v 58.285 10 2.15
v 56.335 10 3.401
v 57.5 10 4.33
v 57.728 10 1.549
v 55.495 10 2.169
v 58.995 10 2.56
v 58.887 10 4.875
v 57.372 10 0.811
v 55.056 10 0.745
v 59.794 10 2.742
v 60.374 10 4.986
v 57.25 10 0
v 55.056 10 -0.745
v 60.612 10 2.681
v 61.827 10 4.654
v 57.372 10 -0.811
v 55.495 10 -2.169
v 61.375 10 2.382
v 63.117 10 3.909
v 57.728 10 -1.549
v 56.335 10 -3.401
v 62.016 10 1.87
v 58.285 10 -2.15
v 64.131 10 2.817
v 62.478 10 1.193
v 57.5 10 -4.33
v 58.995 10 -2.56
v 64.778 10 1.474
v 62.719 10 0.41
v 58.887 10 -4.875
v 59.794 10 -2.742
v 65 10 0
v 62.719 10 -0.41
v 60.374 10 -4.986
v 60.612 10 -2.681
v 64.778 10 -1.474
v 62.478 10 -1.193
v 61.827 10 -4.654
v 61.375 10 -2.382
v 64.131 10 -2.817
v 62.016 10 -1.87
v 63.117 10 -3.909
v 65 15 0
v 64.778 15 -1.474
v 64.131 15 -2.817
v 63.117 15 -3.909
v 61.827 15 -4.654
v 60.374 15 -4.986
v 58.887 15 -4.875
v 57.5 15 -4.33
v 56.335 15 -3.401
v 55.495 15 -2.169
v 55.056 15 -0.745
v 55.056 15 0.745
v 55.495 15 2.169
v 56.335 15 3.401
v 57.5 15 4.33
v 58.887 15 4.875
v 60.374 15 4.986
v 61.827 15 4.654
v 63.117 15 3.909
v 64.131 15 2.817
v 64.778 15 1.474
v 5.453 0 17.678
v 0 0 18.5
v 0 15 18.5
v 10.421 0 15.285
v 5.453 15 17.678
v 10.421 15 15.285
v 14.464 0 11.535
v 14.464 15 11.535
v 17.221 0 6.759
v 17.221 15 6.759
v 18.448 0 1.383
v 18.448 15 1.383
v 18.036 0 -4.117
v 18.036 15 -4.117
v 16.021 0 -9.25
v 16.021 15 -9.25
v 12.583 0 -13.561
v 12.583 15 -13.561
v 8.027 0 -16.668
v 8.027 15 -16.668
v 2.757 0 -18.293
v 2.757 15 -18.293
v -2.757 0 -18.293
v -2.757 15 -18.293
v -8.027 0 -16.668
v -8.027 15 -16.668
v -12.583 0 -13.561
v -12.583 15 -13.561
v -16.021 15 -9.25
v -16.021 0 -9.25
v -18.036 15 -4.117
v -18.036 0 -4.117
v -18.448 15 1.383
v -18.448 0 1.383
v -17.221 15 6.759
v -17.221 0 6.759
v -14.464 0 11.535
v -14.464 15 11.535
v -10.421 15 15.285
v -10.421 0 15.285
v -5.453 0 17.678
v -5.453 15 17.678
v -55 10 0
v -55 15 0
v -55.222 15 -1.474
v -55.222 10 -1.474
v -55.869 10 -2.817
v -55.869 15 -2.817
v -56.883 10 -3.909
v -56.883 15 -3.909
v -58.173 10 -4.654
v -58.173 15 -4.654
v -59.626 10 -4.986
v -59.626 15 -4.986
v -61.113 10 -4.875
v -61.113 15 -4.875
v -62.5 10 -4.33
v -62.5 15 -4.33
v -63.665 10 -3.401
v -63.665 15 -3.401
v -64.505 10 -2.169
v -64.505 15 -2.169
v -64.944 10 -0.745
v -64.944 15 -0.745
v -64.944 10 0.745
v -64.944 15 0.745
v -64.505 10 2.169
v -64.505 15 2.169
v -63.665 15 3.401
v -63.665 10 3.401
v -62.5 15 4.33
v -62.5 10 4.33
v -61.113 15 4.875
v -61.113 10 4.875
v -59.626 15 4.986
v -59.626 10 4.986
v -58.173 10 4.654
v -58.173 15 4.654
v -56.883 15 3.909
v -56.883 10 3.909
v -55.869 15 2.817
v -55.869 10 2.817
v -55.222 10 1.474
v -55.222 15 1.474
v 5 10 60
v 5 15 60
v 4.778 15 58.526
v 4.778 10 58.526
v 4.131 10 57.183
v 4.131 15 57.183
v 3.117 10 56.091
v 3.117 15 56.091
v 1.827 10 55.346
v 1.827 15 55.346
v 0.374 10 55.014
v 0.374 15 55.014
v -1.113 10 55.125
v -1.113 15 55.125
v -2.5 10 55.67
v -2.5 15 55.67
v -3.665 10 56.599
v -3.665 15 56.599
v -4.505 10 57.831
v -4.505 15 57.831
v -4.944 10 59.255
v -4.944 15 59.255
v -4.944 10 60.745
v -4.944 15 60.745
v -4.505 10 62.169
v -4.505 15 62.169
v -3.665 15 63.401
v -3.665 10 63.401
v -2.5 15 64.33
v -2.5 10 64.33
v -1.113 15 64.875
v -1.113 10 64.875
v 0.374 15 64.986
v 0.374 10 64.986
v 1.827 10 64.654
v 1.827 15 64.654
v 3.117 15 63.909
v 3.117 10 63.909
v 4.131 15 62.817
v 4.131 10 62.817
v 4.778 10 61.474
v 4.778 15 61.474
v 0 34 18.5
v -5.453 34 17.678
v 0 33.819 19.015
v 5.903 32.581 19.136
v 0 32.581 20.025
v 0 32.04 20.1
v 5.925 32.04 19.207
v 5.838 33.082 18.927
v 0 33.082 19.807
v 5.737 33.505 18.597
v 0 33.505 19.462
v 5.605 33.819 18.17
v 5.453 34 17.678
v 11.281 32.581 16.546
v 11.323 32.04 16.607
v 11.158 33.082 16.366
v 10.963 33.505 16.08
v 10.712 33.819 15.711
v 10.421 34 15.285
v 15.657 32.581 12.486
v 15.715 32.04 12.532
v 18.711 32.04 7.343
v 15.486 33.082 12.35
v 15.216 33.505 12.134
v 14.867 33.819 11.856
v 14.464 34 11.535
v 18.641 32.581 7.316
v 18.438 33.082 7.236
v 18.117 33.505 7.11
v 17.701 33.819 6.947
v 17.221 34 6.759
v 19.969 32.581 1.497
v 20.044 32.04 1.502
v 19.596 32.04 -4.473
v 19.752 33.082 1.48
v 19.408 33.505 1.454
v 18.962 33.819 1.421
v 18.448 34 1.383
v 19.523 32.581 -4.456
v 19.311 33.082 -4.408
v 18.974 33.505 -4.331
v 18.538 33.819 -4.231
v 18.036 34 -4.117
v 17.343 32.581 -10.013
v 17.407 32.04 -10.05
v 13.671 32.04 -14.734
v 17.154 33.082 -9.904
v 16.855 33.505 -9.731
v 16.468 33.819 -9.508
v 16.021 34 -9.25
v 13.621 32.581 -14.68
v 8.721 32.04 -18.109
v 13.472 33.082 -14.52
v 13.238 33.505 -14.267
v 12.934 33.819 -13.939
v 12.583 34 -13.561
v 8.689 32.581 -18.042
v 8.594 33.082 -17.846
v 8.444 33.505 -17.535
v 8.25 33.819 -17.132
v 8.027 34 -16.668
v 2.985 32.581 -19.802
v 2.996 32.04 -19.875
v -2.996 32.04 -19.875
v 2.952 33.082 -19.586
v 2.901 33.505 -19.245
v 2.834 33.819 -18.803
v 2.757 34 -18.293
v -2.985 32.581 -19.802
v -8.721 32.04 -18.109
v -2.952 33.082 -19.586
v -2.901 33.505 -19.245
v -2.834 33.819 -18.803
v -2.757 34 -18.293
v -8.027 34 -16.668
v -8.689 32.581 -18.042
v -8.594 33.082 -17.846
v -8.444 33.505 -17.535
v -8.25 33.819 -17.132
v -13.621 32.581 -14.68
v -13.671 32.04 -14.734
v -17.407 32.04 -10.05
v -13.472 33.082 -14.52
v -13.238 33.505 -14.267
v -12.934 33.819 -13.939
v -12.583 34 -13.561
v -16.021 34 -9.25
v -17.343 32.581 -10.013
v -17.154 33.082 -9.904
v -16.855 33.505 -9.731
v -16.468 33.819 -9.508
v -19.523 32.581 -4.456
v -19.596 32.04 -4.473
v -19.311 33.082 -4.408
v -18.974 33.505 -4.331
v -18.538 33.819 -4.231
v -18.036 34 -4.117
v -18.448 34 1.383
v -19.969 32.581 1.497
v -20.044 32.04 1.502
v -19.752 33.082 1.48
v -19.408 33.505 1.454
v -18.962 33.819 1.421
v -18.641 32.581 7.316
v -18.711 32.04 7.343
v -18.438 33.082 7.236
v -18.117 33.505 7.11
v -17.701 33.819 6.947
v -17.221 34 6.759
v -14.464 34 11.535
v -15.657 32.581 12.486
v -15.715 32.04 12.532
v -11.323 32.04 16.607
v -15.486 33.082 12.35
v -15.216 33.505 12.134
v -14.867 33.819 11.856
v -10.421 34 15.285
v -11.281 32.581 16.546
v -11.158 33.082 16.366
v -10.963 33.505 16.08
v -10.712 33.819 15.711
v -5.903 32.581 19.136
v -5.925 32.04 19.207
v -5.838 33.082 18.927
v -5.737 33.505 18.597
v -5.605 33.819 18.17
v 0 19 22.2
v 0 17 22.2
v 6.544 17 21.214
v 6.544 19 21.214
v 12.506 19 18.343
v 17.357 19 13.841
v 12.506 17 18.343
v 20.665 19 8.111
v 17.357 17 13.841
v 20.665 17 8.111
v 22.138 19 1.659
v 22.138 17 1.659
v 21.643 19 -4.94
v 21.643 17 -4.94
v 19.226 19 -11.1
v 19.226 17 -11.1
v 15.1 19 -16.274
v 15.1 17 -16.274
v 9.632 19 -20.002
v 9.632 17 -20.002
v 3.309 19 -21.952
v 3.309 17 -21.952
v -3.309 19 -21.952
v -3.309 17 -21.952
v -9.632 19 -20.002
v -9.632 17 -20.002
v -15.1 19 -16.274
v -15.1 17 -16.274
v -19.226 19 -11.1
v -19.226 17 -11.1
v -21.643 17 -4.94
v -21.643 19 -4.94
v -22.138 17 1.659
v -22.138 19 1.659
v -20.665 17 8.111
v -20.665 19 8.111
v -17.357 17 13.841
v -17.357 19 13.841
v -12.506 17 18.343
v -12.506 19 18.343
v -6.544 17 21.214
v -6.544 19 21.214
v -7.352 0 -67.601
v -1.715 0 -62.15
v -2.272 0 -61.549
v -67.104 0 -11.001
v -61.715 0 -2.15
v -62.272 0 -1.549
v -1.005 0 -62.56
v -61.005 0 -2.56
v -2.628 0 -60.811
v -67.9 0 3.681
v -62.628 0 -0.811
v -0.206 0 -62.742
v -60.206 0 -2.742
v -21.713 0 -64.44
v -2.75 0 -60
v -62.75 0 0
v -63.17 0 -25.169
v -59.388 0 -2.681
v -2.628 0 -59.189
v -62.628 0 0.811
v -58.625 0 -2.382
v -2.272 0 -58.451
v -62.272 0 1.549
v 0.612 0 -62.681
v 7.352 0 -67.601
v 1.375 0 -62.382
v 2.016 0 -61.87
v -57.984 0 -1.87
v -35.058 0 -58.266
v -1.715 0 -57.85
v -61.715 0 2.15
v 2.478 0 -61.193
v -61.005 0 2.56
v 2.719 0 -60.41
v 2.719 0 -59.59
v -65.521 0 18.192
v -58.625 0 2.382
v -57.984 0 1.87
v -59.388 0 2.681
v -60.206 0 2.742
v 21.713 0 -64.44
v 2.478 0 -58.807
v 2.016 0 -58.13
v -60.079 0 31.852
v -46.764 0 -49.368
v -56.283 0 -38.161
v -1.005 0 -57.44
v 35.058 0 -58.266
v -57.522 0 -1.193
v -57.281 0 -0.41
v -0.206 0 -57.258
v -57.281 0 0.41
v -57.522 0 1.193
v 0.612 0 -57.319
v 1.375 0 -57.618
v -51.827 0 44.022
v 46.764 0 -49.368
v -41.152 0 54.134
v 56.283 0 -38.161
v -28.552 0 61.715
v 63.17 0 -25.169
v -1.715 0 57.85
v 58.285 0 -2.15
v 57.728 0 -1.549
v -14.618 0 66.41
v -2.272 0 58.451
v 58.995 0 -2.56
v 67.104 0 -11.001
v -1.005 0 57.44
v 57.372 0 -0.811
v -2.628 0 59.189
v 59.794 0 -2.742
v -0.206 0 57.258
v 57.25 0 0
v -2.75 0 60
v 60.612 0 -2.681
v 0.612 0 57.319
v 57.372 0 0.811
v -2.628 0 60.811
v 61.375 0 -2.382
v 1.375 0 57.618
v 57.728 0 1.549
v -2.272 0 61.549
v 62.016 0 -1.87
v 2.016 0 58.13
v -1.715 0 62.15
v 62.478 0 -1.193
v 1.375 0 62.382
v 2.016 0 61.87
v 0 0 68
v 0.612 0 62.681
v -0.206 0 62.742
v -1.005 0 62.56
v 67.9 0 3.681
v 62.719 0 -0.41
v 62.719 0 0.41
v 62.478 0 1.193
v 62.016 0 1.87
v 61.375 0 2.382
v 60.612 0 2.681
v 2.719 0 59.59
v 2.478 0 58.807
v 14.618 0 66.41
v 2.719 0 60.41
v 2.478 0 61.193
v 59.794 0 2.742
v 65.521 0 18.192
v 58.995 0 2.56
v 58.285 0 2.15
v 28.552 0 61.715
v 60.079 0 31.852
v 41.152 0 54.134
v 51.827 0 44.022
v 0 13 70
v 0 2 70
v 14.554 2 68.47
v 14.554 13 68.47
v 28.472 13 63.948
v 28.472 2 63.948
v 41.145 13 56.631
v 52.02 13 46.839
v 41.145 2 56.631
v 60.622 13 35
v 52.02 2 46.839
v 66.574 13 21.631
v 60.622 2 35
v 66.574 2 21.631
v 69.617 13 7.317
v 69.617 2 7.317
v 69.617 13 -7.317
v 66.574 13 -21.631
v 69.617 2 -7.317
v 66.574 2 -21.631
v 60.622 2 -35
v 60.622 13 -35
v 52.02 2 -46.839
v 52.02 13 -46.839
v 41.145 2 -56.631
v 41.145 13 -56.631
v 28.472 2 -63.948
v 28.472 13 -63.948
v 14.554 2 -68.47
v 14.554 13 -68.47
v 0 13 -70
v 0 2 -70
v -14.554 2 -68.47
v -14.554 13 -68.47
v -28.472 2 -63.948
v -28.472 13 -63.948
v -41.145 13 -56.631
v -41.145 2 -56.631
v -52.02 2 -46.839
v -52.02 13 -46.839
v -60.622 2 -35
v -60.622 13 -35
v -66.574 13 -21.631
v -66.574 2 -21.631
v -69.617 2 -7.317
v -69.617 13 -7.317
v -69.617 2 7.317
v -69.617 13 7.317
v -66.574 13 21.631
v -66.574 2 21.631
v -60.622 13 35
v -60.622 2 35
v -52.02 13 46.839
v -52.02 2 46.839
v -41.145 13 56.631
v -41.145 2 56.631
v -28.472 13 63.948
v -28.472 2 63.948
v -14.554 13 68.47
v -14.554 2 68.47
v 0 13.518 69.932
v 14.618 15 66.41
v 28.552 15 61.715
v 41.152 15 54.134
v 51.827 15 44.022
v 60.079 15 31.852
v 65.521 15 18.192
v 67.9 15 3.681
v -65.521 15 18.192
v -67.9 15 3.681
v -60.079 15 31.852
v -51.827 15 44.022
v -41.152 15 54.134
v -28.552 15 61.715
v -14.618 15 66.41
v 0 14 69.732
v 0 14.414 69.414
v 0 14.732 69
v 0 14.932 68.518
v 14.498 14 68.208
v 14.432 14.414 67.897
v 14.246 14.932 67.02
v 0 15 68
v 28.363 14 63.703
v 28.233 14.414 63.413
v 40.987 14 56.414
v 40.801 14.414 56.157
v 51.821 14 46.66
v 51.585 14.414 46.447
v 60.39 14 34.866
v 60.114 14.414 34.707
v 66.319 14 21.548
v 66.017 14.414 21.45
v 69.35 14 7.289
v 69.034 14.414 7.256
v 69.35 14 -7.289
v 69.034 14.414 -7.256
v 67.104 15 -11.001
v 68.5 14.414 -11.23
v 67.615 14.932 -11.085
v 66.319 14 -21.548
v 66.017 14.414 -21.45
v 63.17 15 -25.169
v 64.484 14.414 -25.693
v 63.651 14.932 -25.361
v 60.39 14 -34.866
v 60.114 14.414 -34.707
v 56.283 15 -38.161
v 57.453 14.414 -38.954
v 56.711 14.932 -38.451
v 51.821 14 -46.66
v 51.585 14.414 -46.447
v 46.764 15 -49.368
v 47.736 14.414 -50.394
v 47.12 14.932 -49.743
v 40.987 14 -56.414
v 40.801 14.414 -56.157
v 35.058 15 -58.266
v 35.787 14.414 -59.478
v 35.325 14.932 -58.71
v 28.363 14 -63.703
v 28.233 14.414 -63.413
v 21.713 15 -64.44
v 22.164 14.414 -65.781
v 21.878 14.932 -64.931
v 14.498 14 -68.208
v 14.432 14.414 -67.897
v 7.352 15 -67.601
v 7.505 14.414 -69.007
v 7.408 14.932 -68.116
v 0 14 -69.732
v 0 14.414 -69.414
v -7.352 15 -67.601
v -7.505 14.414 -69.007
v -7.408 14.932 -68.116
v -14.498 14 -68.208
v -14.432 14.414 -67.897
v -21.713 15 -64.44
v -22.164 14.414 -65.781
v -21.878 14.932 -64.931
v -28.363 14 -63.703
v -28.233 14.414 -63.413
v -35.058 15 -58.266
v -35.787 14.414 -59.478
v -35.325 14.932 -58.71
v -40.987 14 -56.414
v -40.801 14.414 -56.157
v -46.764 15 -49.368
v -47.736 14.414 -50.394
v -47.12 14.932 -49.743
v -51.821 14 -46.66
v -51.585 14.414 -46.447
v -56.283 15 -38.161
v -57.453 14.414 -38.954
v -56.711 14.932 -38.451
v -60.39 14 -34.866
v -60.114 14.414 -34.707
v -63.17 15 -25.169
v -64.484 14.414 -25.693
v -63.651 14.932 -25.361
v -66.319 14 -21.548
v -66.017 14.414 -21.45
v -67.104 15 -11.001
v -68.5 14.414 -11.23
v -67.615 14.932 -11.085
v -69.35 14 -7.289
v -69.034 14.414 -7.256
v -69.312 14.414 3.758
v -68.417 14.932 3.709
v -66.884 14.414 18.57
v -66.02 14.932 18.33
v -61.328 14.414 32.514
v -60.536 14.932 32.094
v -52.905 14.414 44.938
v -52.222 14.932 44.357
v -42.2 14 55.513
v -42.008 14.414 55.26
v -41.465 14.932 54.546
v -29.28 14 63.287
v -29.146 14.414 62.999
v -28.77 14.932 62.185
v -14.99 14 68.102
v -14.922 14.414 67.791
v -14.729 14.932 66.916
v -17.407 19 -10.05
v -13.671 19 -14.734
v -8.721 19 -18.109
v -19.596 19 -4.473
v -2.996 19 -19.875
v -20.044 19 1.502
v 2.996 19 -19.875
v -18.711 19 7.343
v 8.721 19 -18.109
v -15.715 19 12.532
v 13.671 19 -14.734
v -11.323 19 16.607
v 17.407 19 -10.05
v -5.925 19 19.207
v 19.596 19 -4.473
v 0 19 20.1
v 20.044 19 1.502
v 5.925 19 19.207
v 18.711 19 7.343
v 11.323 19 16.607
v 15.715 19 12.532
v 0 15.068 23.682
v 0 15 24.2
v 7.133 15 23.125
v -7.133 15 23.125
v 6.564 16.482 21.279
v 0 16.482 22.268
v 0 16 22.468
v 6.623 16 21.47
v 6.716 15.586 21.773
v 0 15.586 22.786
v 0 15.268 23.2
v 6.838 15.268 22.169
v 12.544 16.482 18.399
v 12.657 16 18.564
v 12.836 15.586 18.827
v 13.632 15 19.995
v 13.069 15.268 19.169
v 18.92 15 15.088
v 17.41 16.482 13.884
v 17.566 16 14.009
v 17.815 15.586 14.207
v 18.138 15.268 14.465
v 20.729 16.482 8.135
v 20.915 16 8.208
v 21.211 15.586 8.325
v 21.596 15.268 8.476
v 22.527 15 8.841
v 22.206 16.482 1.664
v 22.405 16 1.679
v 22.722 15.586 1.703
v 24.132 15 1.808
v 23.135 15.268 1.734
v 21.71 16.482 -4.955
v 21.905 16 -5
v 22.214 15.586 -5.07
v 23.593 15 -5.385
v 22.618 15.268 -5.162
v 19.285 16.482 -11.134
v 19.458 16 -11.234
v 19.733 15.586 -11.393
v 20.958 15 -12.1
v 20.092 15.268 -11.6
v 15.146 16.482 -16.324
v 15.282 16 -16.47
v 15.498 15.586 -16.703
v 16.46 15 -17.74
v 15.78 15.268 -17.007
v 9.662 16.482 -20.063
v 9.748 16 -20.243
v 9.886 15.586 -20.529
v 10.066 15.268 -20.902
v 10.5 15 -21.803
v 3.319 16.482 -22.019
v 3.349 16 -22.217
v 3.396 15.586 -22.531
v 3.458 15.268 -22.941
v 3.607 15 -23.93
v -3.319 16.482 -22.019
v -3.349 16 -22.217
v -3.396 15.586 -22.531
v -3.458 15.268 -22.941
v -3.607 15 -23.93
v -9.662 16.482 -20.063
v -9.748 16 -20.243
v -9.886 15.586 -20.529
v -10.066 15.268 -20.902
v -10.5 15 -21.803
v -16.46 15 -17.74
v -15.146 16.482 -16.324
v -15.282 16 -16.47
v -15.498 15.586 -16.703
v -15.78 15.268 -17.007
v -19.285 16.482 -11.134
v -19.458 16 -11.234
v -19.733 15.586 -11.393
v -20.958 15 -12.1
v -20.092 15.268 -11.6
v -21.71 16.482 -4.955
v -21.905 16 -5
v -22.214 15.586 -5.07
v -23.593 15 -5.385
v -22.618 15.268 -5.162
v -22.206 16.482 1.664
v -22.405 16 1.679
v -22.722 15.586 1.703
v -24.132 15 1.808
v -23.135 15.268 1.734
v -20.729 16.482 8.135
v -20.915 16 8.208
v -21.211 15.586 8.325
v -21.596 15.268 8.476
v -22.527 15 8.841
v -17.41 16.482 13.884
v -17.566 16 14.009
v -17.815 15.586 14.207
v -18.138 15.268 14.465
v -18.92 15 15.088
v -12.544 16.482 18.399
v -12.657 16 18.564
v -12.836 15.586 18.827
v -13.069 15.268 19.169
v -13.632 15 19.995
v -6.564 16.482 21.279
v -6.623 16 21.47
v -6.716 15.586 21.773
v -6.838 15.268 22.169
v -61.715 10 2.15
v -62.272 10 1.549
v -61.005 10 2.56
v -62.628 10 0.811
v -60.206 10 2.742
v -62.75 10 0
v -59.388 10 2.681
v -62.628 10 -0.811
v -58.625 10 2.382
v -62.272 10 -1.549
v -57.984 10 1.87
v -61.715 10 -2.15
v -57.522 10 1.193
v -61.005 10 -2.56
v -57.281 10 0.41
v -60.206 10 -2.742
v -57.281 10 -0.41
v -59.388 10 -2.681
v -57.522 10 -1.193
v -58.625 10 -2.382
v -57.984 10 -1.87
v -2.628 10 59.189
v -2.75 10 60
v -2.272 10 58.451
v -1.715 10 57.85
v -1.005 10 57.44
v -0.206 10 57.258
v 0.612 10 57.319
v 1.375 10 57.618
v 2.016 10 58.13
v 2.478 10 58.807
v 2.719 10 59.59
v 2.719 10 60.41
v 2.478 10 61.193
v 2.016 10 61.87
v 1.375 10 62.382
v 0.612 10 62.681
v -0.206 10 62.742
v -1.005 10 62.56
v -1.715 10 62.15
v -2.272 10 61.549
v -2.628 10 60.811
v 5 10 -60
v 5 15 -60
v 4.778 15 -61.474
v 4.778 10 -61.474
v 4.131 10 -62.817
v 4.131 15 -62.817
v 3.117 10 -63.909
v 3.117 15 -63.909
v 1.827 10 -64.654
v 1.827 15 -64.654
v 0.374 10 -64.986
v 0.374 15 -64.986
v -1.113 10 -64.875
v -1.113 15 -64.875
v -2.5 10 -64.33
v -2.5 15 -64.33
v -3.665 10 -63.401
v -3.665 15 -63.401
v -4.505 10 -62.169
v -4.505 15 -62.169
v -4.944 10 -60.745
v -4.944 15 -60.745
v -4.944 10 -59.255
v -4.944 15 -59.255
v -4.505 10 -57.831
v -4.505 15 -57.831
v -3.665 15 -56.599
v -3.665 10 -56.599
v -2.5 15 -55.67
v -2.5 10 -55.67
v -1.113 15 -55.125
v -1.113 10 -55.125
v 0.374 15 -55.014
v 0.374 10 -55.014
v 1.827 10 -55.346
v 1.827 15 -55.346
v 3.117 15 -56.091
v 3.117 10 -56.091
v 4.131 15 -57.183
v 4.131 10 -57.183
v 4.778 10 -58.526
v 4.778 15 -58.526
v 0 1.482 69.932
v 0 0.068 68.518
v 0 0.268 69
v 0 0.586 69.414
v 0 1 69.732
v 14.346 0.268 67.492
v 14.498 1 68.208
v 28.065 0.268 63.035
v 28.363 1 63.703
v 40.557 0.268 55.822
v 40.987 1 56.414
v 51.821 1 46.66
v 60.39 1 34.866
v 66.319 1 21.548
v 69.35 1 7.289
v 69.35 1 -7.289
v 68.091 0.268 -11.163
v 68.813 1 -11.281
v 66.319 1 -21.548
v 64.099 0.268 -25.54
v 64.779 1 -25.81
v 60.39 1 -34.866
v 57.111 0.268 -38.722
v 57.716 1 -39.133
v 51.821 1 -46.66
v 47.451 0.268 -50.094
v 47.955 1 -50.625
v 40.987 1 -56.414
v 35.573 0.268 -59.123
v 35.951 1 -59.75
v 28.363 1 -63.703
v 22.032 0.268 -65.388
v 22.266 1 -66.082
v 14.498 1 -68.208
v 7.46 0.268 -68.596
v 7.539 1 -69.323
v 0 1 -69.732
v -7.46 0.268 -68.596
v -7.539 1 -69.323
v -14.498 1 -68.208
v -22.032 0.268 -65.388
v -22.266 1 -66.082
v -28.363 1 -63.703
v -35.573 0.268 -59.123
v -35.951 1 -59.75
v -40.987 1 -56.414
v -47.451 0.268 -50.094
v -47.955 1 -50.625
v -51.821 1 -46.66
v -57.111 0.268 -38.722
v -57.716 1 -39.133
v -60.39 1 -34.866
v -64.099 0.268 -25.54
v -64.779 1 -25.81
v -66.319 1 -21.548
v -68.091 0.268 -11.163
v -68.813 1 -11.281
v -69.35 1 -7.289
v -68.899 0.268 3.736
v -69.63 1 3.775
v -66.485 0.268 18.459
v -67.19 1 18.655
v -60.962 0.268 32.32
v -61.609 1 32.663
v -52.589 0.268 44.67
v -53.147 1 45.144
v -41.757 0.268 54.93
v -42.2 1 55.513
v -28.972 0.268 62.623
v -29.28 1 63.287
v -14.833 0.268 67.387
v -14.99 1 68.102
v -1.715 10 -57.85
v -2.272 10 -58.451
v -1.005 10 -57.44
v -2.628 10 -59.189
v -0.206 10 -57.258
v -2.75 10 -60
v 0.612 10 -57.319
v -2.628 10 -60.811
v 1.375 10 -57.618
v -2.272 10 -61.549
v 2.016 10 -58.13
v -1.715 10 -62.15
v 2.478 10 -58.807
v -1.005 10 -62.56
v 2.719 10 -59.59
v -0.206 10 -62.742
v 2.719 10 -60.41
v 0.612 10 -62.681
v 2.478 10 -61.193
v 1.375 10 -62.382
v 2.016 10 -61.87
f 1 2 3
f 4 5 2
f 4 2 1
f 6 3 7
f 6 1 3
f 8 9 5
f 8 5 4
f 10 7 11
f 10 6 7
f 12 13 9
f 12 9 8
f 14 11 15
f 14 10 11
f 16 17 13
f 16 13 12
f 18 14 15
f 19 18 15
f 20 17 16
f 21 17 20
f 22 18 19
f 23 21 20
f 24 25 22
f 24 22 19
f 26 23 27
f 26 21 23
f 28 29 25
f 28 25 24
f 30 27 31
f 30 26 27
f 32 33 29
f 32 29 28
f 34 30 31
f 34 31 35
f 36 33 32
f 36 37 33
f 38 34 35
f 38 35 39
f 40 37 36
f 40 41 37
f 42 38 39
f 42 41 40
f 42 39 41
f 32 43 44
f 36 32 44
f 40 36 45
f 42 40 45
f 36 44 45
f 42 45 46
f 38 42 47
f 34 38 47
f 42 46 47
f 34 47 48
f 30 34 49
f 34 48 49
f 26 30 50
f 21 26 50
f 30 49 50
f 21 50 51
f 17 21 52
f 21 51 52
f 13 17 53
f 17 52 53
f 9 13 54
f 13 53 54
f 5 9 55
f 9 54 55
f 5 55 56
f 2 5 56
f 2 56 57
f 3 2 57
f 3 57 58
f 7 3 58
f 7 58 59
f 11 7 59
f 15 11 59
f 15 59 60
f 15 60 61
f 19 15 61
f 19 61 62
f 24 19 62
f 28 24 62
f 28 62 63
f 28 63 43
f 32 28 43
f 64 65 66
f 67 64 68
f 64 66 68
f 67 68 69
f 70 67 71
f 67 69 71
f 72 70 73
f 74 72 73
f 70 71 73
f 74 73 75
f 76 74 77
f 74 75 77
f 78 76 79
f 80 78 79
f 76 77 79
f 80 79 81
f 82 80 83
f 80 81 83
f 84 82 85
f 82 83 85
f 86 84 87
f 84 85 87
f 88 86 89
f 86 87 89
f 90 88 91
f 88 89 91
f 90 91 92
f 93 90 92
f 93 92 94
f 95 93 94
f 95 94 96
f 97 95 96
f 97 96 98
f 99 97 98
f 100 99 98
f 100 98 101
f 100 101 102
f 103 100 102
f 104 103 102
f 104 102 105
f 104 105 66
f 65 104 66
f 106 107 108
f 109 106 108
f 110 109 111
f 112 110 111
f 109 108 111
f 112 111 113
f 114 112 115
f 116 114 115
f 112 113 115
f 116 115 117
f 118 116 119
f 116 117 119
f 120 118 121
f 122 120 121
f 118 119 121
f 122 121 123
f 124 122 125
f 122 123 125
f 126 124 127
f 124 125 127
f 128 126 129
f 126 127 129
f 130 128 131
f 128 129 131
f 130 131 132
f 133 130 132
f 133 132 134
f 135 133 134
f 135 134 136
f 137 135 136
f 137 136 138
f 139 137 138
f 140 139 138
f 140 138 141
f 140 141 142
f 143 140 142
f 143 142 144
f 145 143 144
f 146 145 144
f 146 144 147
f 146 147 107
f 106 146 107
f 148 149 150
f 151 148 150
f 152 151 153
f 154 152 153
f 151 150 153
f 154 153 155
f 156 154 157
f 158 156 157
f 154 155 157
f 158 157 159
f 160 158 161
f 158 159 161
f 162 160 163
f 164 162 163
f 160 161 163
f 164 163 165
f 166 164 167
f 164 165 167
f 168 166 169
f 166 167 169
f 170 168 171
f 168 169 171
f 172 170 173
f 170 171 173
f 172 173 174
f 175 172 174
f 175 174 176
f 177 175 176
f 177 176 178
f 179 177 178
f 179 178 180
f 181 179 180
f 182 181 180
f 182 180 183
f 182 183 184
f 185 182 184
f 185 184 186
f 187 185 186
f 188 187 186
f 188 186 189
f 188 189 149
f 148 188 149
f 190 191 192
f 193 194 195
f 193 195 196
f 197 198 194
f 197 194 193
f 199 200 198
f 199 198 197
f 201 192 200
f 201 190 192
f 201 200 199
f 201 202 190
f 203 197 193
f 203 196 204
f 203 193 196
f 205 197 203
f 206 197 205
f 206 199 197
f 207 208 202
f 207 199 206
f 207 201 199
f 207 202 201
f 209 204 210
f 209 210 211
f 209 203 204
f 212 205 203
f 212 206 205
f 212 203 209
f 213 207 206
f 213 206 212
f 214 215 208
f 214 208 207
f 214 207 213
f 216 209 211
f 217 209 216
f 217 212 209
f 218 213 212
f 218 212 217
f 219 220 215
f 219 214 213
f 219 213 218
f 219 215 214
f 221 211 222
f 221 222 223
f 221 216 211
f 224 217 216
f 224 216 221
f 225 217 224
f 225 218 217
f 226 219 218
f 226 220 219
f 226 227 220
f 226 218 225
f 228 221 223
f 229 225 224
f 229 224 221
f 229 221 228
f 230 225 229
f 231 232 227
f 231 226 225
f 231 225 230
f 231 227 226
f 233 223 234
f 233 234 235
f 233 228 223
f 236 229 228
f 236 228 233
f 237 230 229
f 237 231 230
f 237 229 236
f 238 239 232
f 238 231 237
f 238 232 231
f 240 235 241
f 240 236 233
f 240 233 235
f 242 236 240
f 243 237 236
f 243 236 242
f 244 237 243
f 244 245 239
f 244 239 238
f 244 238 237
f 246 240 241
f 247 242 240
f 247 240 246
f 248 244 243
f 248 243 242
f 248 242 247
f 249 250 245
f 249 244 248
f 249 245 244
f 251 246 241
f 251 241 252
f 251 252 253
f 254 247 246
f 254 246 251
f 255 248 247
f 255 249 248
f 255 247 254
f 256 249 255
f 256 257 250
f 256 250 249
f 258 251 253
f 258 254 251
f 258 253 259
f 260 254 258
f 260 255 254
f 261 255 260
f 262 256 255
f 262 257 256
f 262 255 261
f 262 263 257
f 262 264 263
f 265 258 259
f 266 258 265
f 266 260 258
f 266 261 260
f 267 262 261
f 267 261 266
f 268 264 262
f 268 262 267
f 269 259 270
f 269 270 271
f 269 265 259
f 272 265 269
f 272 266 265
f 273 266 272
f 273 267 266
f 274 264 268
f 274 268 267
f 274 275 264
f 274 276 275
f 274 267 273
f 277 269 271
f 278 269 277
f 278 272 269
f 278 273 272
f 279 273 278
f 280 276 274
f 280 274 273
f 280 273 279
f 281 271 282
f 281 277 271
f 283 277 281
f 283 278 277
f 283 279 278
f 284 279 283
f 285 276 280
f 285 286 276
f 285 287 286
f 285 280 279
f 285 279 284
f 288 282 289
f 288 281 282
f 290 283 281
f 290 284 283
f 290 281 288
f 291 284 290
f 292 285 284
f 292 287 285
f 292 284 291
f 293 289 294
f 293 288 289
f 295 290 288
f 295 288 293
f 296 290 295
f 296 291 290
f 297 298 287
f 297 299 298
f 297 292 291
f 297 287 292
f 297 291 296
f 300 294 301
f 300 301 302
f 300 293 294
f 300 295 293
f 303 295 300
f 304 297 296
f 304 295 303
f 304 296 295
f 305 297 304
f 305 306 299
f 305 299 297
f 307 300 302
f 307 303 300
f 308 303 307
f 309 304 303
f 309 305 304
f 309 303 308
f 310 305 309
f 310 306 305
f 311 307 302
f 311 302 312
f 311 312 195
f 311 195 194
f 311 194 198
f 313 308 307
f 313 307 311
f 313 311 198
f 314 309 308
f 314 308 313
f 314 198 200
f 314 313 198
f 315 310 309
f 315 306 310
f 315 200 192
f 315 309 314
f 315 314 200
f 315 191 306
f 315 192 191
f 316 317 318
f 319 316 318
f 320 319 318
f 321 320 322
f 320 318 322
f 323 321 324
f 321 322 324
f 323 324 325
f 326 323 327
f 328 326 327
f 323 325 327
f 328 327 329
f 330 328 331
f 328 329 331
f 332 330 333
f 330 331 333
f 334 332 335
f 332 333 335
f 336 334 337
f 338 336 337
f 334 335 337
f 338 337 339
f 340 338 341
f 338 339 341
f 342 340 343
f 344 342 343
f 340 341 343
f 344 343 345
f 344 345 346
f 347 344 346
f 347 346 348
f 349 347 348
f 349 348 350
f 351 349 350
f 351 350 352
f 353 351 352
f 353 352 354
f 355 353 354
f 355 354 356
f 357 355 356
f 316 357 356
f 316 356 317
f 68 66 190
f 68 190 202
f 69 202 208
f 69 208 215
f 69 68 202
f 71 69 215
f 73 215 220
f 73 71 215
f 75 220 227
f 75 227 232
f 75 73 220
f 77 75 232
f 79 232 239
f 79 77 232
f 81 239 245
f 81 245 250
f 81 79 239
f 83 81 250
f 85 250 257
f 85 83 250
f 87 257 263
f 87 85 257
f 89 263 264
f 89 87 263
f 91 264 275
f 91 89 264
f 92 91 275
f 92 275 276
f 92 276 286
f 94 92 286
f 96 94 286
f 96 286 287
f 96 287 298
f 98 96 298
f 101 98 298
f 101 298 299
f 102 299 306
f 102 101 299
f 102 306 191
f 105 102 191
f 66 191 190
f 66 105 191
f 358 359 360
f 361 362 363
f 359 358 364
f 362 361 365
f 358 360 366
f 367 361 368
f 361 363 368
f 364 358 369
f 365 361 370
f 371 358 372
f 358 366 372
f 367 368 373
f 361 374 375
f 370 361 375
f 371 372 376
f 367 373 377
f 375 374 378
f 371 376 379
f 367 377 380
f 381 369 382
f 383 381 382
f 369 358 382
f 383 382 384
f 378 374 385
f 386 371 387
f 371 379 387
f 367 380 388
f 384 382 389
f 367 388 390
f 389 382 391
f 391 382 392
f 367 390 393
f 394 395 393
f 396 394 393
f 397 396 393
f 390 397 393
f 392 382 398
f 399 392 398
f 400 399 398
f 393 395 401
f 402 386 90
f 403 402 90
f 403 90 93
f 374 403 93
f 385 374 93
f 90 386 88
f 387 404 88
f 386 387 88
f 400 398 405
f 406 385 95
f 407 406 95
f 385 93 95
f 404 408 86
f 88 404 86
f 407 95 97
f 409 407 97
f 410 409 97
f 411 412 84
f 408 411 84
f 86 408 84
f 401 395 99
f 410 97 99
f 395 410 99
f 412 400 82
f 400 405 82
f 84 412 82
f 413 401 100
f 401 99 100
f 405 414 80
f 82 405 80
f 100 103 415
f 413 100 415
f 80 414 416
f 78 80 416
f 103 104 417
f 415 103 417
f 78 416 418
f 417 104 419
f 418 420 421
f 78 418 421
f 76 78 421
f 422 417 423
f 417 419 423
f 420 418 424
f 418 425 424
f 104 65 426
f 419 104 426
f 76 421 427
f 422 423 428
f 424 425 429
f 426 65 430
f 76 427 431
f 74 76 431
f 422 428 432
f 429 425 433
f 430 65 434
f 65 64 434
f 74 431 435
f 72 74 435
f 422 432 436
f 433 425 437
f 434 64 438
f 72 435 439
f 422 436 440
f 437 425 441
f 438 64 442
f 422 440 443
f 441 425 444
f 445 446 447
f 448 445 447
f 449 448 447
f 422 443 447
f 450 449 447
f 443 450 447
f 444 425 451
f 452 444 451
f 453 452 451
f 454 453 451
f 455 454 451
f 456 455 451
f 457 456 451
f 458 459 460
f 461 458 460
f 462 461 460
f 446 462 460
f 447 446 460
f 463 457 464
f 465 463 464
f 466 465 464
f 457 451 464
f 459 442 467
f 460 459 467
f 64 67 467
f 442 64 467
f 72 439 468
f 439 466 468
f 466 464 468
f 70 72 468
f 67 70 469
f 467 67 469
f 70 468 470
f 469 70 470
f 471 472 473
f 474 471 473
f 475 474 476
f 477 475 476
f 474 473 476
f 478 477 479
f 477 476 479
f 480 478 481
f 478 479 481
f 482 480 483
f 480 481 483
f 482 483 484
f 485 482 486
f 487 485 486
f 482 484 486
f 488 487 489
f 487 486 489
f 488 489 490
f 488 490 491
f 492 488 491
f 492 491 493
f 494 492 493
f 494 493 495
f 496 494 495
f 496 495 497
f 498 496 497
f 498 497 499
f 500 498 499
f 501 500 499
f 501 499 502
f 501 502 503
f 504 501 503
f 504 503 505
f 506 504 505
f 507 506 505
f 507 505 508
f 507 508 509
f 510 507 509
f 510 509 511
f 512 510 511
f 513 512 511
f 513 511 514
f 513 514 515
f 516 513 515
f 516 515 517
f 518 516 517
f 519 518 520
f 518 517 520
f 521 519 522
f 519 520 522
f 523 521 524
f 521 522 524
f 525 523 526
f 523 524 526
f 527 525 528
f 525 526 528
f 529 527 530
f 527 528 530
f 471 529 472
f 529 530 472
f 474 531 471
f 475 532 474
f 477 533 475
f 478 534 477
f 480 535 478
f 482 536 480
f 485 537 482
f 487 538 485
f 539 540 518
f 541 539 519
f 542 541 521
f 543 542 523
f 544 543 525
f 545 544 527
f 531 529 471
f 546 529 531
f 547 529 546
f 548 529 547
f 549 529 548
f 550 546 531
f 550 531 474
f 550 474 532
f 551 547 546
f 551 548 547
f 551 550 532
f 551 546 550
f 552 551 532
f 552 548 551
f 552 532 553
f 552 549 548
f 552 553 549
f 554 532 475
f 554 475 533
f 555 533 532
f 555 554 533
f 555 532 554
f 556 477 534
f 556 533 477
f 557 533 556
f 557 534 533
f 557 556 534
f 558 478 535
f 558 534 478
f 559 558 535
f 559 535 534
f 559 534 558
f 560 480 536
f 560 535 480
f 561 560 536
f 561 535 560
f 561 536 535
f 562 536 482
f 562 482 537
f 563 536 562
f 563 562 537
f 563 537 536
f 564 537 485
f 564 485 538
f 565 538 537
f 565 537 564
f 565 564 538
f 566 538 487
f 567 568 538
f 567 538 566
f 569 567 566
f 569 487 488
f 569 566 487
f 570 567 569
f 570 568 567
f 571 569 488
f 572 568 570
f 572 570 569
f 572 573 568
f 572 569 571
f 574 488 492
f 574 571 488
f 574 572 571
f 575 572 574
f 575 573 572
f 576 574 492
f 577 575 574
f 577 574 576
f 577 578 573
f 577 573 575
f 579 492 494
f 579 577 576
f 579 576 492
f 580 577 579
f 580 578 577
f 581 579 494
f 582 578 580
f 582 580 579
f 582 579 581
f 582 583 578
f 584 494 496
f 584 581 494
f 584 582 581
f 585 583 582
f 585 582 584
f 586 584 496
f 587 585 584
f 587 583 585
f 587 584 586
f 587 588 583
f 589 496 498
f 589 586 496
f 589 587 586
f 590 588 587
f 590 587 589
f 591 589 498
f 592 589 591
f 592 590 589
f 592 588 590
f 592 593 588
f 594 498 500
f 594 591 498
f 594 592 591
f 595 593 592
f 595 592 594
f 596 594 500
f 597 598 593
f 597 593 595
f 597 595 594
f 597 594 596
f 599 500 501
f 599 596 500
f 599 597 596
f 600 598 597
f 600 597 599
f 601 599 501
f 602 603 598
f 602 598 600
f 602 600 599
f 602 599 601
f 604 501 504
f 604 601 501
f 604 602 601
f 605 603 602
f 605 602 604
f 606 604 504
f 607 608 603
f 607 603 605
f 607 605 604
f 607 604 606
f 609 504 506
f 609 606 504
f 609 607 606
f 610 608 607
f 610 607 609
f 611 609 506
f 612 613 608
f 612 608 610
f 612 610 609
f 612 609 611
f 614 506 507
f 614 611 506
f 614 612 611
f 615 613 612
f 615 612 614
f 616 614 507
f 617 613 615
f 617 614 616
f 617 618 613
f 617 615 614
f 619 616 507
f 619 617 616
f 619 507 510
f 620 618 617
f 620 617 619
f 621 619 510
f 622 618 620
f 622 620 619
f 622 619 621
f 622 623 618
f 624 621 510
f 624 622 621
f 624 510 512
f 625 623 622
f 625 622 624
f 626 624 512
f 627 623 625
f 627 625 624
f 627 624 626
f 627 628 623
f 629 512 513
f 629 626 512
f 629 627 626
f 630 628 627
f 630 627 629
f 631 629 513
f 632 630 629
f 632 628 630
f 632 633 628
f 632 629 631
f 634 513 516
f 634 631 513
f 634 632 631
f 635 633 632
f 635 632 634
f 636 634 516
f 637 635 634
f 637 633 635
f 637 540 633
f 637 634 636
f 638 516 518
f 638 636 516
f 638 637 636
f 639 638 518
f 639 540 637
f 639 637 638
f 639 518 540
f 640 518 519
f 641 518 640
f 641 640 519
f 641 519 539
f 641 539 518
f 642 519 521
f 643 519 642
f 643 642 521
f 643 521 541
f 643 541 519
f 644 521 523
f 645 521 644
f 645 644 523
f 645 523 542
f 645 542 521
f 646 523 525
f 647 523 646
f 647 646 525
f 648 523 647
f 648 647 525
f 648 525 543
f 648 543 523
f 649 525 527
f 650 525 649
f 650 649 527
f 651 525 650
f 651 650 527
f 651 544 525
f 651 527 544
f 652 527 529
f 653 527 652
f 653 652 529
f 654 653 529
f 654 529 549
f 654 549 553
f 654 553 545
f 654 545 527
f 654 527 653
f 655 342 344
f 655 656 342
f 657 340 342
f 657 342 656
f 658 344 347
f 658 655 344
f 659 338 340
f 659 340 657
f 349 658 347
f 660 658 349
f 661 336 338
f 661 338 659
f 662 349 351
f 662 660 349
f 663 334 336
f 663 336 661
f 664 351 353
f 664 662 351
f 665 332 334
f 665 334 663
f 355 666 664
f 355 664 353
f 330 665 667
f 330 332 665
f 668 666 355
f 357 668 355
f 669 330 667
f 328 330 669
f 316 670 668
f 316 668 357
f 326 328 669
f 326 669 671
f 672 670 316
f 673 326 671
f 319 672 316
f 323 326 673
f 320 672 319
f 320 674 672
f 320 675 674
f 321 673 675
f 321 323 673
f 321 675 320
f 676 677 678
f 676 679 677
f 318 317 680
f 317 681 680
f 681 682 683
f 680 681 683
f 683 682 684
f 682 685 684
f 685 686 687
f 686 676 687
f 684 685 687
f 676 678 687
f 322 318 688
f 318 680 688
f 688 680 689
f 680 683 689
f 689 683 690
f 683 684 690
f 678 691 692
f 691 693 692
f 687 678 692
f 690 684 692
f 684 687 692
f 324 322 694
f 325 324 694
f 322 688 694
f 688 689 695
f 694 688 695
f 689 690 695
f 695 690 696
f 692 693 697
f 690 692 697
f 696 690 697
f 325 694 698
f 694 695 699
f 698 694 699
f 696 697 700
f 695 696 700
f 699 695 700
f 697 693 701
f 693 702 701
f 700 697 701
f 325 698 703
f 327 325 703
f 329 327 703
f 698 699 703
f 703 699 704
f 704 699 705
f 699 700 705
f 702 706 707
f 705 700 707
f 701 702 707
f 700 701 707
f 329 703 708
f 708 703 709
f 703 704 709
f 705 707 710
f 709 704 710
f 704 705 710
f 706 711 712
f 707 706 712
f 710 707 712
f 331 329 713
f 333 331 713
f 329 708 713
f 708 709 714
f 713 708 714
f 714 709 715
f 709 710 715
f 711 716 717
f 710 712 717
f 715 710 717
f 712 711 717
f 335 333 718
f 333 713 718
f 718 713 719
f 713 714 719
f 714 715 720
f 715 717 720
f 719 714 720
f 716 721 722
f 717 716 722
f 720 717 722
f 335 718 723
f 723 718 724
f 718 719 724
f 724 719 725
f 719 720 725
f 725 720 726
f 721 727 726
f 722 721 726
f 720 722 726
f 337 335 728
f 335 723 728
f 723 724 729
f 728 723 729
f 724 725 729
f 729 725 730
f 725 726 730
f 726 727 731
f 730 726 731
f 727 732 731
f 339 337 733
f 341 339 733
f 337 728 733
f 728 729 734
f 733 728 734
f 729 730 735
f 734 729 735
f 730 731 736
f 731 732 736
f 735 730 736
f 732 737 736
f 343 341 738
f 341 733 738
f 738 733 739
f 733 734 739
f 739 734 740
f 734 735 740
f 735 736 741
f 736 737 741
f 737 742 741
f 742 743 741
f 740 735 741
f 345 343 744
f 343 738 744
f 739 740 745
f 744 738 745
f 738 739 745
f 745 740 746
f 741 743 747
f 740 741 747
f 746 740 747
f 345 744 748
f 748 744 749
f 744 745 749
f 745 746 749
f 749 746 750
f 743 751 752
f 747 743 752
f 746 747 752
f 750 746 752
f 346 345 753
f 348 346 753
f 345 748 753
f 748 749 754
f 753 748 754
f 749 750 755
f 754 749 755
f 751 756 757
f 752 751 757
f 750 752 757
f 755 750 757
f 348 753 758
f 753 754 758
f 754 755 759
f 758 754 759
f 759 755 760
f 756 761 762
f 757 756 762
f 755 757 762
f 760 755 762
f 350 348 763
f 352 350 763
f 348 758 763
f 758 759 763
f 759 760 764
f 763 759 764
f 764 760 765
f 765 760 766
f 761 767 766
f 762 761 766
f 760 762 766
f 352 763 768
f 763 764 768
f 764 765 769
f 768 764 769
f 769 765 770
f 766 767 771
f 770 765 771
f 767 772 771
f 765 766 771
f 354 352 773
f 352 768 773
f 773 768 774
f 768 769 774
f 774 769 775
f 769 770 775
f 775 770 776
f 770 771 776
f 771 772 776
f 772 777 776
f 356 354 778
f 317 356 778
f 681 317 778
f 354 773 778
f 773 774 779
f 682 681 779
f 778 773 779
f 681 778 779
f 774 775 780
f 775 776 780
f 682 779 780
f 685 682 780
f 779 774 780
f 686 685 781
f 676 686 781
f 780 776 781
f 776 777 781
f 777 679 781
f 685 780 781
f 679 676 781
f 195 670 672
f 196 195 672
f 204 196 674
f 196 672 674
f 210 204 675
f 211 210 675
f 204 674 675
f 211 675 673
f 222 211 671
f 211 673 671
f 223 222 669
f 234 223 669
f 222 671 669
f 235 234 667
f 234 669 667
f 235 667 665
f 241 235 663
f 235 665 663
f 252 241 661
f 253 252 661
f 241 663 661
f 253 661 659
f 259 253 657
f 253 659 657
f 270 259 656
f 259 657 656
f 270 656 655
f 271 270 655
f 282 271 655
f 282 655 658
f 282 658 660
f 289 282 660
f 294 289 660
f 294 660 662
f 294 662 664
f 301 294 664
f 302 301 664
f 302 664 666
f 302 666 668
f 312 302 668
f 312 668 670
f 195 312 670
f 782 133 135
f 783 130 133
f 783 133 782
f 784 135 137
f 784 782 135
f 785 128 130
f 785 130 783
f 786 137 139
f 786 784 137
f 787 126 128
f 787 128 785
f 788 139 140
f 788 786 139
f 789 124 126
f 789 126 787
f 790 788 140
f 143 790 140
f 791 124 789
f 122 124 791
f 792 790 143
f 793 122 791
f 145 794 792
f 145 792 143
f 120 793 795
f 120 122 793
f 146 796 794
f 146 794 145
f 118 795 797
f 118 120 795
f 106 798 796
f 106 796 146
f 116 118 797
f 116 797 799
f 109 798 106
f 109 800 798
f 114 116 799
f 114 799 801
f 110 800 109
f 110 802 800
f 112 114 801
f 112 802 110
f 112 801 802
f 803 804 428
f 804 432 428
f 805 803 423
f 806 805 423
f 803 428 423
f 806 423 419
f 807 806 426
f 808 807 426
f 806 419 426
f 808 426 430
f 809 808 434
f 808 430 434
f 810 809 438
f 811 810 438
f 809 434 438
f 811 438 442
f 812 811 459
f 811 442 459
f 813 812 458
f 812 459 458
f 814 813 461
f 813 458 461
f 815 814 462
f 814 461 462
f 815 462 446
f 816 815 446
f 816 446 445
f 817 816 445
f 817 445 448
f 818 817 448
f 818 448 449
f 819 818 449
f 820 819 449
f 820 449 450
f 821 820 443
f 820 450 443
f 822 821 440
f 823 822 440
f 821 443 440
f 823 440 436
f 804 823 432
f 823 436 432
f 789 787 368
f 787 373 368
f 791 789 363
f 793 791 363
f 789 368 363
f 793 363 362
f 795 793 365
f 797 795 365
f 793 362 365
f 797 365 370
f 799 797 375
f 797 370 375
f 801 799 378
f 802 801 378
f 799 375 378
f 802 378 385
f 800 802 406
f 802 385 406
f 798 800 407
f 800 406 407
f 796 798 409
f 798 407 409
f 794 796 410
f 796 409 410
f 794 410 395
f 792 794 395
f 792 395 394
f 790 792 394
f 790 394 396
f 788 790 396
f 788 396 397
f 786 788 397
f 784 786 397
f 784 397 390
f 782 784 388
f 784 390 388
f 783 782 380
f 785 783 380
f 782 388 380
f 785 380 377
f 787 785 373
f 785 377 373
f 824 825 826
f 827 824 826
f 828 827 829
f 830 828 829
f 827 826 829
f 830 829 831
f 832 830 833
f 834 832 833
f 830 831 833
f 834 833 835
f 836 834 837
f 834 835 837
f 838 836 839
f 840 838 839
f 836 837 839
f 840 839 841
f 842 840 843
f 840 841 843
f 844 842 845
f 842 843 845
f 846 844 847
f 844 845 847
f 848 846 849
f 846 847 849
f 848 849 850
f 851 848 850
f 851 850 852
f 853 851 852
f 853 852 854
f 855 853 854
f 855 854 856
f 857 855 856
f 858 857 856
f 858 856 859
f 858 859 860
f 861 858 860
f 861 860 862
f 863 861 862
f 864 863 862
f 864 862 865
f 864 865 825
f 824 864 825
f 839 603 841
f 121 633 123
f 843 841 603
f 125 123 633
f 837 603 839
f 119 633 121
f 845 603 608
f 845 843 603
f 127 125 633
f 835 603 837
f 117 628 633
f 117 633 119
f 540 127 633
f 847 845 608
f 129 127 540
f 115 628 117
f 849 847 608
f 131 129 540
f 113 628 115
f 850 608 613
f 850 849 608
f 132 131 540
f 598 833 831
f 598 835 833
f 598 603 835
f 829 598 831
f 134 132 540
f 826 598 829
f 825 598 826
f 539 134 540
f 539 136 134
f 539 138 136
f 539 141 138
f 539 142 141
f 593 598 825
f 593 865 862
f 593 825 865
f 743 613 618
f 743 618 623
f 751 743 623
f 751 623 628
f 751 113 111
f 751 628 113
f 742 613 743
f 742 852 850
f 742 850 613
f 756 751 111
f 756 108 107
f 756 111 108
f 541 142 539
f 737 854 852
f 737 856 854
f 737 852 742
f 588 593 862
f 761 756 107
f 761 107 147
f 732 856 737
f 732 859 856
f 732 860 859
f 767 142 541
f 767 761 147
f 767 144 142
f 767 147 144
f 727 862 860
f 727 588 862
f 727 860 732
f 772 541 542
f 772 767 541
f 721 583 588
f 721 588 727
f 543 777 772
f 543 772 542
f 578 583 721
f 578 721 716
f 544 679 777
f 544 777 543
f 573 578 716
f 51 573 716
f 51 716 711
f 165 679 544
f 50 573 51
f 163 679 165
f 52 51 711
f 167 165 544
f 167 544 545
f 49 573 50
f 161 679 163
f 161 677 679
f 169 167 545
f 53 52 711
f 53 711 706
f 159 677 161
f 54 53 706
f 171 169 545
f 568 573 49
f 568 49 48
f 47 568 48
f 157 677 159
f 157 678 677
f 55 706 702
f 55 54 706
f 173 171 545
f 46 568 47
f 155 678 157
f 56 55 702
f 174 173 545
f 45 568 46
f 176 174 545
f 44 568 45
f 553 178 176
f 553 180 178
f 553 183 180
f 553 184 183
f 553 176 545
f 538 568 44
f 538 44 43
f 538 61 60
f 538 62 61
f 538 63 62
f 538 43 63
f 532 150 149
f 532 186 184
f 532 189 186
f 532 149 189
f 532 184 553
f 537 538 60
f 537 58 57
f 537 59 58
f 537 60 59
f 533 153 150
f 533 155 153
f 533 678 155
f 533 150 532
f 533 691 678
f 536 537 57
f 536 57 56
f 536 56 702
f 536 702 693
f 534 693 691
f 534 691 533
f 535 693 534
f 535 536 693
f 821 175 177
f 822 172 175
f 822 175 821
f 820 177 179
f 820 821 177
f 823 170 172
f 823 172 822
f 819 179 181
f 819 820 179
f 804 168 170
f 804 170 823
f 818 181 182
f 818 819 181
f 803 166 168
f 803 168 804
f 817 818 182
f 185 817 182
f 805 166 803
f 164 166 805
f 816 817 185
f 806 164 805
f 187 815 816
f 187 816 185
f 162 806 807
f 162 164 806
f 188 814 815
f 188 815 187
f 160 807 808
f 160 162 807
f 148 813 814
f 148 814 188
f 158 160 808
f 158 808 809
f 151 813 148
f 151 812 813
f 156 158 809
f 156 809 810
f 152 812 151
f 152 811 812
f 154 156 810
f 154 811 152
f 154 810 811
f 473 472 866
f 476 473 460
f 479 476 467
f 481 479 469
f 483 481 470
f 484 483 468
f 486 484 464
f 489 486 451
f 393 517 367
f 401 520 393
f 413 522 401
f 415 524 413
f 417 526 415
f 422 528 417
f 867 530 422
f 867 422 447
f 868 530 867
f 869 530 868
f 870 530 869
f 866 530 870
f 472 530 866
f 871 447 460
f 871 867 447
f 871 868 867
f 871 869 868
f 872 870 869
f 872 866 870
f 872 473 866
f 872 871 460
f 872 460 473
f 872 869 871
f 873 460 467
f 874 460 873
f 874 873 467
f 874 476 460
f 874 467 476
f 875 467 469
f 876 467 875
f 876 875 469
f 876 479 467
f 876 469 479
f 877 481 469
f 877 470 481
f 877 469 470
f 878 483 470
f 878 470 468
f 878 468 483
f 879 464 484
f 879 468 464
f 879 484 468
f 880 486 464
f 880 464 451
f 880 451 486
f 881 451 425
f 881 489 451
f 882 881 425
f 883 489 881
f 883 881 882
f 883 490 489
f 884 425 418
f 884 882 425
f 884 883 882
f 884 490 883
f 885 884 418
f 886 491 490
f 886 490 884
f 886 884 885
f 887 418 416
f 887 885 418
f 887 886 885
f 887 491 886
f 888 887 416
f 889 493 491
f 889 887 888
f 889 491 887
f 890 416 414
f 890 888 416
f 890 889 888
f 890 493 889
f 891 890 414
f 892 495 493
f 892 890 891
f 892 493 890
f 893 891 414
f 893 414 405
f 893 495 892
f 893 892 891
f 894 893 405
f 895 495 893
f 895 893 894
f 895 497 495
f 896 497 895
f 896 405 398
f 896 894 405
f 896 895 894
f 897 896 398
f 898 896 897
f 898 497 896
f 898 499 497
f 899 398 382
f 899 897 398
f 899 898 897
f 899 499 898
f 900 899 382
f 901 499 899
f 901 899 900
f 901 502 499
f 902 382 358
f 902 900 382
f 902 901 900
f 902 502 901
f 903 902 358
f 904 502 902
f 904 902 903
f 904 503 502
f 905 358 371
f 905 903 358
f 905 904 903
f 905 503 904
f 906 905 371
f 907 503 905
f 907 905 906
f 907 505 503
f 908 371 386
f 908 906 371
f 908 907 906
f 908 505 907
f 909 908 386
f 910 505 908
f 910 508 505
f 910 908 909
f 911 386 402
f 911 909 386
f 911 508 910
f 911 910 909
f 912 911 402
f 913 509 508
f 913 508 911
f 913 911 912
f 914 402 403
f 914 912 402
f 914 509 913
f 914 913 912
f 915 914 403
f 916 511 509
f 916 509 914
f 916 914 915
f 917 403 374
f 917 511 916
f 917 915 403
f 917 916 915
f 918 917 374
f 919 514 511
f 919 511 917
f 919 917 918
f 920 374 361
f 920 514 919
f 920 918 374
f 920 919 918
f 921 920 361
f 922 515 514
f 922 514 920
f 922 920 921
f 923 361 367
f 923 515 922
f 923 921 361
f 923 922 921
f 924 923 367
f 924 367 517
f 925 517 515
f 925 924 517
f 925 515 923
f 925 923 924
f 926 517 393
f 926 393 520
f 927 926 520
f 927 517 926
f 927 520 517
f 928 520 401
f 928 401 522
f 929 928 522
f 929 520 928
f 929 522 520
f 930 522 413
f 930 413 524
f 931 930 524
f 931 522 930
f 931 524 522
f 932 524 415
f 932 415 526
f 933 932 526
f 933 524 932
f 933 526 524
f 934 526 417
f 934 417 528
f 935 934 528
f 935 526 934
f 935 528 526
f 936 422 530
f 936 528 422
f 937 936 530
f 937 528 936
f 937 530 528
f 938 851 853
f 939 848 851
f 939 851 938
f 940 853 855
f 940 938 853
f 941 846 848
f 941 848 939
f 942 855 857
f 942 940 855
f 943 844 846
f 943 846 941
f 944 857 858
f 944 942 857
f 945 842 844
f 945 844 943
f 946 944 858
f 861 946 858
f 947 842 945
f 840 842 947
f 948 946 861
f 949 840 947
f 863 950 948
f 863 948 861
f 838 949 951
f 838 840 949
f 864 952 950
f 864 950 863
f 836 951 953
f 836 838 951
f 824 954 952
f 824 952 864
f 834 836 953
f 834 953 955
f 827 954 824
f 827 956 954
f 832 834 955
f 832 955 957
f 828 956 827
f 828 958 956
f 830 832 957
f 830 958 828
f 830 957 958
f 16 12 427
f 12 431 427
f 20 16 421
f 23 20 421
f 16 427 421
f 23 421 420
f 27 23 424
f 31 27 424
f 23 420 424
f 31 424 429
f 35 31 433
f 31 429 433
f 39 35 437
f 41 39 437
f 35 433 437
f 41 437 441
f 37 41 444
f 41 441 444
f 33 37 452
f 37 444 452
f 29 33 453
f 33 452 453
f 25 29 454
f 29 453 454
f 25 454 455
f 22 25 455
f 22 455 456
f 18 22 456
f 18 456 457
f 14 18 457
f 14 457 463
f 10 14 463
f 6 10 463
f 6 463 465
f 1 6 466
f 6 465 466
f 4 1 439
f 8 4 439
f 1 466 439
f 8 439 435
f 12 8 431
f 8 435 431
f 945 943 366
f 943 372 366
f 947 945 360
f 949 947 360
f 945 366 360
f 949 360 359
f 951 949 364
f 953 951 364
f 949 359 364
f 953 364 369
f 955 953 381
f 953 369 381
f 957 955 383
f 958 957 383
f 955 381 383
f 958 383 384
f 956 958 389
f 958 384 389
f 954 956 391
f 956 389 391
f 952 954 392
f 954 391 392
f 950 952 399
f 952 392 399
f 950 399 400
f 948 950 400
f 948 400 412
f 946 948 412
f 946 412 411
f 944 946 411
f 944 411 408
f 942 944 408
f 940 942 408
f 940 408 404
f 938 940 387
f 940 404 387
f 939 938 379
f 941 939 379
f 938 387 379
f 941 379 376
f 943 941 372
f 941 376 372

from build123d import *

# Parameters (mm, degrees)
SKETCH2_R                      = 70
BOSS_EXTRUDE1_DEPTH            = 15
CBORE_FOR_M5_SHCS1_D           = 5.5
CBORE_FOR_M5_SHCS1_CBORE_D     = 10
CBORE_FOR_M5_SHCS1_CBORE_DEPTH = 5
SKETCH23_R                     = 20.1
SKETCH23_R_2                   = 18.5
BOSS_EXTRUDE2_DEPTH            = 19
SKETCH24_R                     = 18.5
CUT_EXTRUDE4_DEPTH             = 101.801785698
SKETCH25_R                     = 22.2
SKETCH25_R_2                   = 20.1
BOSS_EXTRUDE3_DEPTH            = 4
FILLET2_R                      = 2


with BuildPart() as part:
    # Sketch2 → Boss-Extrude1 (new body)
    with BuildSketch(Plane(origin=(0, 0, 0), x_dir=(1, 0, 0), z_dir=(0, 1, 0))):
        with Locations(Location((0, 0, 0), (0, 0, 270))):
            Circle(SKETCH2_R)
    extrude(amount=BOSS_EXTRUDE1_DEPTH)

    # CBORE for M5 SHCS1 (through all)
    with Locations(Plane(origin=(0, 15, 0), x_dir=(1, 0, 0), z_dir=(0, 1, 0))):
        with Locations((0, 60), (60, 0), (-60, 0), (0, -60)):
            CounterBoreHole(CBORE_FOR_M5_SHCS1_D / 2, CBORE_FOR_M5_SHCS1_CBORE_D / 2, CBORE_FOR_M5_SHCS1_CBORE_DEPTH)

    # Sketch23 → Boss-Extrude2 (add)
    with BuildSketch(Plane(origin=(0, 15, 0), x_dir=(1, 0, 0), z_dir=(0, 1, 0))):
        with Locations(Location((0, 0, 0), (0, 0, 270))):
            Circle(SKETCH23_R)
        with Locations(Location((0, 0, 0), (0, 0, 270))):
            Circle(SKETCH23_R_2, mode=Mode.SUBTRACT)
    extrude(amount=BOSS_EXTRUDE2_DEPTH)

    # Sketch24 → Cut-Extrude4 (cut, through all)
    with BuildSketch(Plane(origin=(0, 15, 0), x_dir=(1, 0, 0), z_dir=(0, 1, 0))):
        with Locations(Location((0, 0, 0), (0, 0, 270))):
            Circle(SKETCH24_R)
    extrude(amount=-CUT_EXTRUDE4_DEPTH, mode=Mode.SUBTRACT)

    # Sketch25 → Boss-Extrude3 (add)
    with BuildSketch(Plane(origin=(0, 15, 0), x_dir=(1, 0, 0), z_dir=(0, 1, 0))):
        with Locations(Location((0, 0, 0), (0, 0, 270))):
            Circle(SKETCH25_R)
        with Locations(Location((0, 0, 0), (0, 0, 270))):
            Circle(SKETCH25_R_2, mode=Mode.SUBTRACT)
    extrude(amount=BOSS_EXTRUDE3_DEPTH)

    # Fillet2
    # the kernel refuses this fillet: 2 mm, written as the material it adds along each edge
    with BuildSketch(Plane(origin=(0, 15, 0), x_dir=(0, 0, 1), z_dir=(-1, 0, 0))) as fillet2_piece_1:
        with BuildLine():
            CenterArc((22.2 + FILLET2_R, FILLET2_R), FILLET2_R, 180, 90)
            Line((22.2, FILLET2_R), (22.2, 0))
            Line((22.2, 0), (22.2 + FILLET2_R, 0))
        make_face()
    revolve(axis=Axis((0, 15, 0), (0, 1, 0)))
    # the kernel refuses this fillet: 2 mm, written as the material it takes off along each edge
    with BuildSketch(Plane(origin=(0, 0, 0), x_dir=(0, 0, 1), z_dir=(-1, 0, 0))) as fillet2_2_piece_1:
        with BuildLine():
            CenterArc((70 - FILLET2_R, FILLET2_R), FILLET2_R, 270, 90)
            Line((70 - FILLET2_R, 0), (70, 0))
            Line((70, 0), (70, FILLET2_R))
        make_face()
    revolve(axis=Axis((0, 0, 0), (0, 1, 0)), mode=Mode.SUBTRACT)
    with BuildSketch(Plane(origin=(0, 34, 0), x_dir=(0, 0, 1), z_dir=(-1, 0, 0))) as fillet2_2_piece_2:
        with BuildLine():
            CenterArc((18.1, -1.959591794), FILLET2_R, 0, 78.463040967)
            Line((20.1, -1.959591794), (20.1, 0))
            Line((20.1, 0), (18.5, 0))
        make_face()
    revolve(axis=Axis((0, 34, 0), (0, 1, 0)), mode=Mode.SUBTRACT)
    with BuildSketch(Plane(origin=(0, 15, 0), x_dir=(0, 0, 1), z_dir=(-1, 0, 0))) as fillet2_2_piece_3:
        with BuildLine():
            CenterArc((70 - FILLET2_R, -FILLET2_R), FILLET2_R, 0, 90)
            Line((70 - FILLET2_R, 0), (70, 0))
            Line((70, 0), (70, -FILLET2_R))
        make_face()
    revolve(axis=Axis((0, 15, 0), (0, 1, 0)), mode=Mode.SUBTRACT)


solid = part.part
